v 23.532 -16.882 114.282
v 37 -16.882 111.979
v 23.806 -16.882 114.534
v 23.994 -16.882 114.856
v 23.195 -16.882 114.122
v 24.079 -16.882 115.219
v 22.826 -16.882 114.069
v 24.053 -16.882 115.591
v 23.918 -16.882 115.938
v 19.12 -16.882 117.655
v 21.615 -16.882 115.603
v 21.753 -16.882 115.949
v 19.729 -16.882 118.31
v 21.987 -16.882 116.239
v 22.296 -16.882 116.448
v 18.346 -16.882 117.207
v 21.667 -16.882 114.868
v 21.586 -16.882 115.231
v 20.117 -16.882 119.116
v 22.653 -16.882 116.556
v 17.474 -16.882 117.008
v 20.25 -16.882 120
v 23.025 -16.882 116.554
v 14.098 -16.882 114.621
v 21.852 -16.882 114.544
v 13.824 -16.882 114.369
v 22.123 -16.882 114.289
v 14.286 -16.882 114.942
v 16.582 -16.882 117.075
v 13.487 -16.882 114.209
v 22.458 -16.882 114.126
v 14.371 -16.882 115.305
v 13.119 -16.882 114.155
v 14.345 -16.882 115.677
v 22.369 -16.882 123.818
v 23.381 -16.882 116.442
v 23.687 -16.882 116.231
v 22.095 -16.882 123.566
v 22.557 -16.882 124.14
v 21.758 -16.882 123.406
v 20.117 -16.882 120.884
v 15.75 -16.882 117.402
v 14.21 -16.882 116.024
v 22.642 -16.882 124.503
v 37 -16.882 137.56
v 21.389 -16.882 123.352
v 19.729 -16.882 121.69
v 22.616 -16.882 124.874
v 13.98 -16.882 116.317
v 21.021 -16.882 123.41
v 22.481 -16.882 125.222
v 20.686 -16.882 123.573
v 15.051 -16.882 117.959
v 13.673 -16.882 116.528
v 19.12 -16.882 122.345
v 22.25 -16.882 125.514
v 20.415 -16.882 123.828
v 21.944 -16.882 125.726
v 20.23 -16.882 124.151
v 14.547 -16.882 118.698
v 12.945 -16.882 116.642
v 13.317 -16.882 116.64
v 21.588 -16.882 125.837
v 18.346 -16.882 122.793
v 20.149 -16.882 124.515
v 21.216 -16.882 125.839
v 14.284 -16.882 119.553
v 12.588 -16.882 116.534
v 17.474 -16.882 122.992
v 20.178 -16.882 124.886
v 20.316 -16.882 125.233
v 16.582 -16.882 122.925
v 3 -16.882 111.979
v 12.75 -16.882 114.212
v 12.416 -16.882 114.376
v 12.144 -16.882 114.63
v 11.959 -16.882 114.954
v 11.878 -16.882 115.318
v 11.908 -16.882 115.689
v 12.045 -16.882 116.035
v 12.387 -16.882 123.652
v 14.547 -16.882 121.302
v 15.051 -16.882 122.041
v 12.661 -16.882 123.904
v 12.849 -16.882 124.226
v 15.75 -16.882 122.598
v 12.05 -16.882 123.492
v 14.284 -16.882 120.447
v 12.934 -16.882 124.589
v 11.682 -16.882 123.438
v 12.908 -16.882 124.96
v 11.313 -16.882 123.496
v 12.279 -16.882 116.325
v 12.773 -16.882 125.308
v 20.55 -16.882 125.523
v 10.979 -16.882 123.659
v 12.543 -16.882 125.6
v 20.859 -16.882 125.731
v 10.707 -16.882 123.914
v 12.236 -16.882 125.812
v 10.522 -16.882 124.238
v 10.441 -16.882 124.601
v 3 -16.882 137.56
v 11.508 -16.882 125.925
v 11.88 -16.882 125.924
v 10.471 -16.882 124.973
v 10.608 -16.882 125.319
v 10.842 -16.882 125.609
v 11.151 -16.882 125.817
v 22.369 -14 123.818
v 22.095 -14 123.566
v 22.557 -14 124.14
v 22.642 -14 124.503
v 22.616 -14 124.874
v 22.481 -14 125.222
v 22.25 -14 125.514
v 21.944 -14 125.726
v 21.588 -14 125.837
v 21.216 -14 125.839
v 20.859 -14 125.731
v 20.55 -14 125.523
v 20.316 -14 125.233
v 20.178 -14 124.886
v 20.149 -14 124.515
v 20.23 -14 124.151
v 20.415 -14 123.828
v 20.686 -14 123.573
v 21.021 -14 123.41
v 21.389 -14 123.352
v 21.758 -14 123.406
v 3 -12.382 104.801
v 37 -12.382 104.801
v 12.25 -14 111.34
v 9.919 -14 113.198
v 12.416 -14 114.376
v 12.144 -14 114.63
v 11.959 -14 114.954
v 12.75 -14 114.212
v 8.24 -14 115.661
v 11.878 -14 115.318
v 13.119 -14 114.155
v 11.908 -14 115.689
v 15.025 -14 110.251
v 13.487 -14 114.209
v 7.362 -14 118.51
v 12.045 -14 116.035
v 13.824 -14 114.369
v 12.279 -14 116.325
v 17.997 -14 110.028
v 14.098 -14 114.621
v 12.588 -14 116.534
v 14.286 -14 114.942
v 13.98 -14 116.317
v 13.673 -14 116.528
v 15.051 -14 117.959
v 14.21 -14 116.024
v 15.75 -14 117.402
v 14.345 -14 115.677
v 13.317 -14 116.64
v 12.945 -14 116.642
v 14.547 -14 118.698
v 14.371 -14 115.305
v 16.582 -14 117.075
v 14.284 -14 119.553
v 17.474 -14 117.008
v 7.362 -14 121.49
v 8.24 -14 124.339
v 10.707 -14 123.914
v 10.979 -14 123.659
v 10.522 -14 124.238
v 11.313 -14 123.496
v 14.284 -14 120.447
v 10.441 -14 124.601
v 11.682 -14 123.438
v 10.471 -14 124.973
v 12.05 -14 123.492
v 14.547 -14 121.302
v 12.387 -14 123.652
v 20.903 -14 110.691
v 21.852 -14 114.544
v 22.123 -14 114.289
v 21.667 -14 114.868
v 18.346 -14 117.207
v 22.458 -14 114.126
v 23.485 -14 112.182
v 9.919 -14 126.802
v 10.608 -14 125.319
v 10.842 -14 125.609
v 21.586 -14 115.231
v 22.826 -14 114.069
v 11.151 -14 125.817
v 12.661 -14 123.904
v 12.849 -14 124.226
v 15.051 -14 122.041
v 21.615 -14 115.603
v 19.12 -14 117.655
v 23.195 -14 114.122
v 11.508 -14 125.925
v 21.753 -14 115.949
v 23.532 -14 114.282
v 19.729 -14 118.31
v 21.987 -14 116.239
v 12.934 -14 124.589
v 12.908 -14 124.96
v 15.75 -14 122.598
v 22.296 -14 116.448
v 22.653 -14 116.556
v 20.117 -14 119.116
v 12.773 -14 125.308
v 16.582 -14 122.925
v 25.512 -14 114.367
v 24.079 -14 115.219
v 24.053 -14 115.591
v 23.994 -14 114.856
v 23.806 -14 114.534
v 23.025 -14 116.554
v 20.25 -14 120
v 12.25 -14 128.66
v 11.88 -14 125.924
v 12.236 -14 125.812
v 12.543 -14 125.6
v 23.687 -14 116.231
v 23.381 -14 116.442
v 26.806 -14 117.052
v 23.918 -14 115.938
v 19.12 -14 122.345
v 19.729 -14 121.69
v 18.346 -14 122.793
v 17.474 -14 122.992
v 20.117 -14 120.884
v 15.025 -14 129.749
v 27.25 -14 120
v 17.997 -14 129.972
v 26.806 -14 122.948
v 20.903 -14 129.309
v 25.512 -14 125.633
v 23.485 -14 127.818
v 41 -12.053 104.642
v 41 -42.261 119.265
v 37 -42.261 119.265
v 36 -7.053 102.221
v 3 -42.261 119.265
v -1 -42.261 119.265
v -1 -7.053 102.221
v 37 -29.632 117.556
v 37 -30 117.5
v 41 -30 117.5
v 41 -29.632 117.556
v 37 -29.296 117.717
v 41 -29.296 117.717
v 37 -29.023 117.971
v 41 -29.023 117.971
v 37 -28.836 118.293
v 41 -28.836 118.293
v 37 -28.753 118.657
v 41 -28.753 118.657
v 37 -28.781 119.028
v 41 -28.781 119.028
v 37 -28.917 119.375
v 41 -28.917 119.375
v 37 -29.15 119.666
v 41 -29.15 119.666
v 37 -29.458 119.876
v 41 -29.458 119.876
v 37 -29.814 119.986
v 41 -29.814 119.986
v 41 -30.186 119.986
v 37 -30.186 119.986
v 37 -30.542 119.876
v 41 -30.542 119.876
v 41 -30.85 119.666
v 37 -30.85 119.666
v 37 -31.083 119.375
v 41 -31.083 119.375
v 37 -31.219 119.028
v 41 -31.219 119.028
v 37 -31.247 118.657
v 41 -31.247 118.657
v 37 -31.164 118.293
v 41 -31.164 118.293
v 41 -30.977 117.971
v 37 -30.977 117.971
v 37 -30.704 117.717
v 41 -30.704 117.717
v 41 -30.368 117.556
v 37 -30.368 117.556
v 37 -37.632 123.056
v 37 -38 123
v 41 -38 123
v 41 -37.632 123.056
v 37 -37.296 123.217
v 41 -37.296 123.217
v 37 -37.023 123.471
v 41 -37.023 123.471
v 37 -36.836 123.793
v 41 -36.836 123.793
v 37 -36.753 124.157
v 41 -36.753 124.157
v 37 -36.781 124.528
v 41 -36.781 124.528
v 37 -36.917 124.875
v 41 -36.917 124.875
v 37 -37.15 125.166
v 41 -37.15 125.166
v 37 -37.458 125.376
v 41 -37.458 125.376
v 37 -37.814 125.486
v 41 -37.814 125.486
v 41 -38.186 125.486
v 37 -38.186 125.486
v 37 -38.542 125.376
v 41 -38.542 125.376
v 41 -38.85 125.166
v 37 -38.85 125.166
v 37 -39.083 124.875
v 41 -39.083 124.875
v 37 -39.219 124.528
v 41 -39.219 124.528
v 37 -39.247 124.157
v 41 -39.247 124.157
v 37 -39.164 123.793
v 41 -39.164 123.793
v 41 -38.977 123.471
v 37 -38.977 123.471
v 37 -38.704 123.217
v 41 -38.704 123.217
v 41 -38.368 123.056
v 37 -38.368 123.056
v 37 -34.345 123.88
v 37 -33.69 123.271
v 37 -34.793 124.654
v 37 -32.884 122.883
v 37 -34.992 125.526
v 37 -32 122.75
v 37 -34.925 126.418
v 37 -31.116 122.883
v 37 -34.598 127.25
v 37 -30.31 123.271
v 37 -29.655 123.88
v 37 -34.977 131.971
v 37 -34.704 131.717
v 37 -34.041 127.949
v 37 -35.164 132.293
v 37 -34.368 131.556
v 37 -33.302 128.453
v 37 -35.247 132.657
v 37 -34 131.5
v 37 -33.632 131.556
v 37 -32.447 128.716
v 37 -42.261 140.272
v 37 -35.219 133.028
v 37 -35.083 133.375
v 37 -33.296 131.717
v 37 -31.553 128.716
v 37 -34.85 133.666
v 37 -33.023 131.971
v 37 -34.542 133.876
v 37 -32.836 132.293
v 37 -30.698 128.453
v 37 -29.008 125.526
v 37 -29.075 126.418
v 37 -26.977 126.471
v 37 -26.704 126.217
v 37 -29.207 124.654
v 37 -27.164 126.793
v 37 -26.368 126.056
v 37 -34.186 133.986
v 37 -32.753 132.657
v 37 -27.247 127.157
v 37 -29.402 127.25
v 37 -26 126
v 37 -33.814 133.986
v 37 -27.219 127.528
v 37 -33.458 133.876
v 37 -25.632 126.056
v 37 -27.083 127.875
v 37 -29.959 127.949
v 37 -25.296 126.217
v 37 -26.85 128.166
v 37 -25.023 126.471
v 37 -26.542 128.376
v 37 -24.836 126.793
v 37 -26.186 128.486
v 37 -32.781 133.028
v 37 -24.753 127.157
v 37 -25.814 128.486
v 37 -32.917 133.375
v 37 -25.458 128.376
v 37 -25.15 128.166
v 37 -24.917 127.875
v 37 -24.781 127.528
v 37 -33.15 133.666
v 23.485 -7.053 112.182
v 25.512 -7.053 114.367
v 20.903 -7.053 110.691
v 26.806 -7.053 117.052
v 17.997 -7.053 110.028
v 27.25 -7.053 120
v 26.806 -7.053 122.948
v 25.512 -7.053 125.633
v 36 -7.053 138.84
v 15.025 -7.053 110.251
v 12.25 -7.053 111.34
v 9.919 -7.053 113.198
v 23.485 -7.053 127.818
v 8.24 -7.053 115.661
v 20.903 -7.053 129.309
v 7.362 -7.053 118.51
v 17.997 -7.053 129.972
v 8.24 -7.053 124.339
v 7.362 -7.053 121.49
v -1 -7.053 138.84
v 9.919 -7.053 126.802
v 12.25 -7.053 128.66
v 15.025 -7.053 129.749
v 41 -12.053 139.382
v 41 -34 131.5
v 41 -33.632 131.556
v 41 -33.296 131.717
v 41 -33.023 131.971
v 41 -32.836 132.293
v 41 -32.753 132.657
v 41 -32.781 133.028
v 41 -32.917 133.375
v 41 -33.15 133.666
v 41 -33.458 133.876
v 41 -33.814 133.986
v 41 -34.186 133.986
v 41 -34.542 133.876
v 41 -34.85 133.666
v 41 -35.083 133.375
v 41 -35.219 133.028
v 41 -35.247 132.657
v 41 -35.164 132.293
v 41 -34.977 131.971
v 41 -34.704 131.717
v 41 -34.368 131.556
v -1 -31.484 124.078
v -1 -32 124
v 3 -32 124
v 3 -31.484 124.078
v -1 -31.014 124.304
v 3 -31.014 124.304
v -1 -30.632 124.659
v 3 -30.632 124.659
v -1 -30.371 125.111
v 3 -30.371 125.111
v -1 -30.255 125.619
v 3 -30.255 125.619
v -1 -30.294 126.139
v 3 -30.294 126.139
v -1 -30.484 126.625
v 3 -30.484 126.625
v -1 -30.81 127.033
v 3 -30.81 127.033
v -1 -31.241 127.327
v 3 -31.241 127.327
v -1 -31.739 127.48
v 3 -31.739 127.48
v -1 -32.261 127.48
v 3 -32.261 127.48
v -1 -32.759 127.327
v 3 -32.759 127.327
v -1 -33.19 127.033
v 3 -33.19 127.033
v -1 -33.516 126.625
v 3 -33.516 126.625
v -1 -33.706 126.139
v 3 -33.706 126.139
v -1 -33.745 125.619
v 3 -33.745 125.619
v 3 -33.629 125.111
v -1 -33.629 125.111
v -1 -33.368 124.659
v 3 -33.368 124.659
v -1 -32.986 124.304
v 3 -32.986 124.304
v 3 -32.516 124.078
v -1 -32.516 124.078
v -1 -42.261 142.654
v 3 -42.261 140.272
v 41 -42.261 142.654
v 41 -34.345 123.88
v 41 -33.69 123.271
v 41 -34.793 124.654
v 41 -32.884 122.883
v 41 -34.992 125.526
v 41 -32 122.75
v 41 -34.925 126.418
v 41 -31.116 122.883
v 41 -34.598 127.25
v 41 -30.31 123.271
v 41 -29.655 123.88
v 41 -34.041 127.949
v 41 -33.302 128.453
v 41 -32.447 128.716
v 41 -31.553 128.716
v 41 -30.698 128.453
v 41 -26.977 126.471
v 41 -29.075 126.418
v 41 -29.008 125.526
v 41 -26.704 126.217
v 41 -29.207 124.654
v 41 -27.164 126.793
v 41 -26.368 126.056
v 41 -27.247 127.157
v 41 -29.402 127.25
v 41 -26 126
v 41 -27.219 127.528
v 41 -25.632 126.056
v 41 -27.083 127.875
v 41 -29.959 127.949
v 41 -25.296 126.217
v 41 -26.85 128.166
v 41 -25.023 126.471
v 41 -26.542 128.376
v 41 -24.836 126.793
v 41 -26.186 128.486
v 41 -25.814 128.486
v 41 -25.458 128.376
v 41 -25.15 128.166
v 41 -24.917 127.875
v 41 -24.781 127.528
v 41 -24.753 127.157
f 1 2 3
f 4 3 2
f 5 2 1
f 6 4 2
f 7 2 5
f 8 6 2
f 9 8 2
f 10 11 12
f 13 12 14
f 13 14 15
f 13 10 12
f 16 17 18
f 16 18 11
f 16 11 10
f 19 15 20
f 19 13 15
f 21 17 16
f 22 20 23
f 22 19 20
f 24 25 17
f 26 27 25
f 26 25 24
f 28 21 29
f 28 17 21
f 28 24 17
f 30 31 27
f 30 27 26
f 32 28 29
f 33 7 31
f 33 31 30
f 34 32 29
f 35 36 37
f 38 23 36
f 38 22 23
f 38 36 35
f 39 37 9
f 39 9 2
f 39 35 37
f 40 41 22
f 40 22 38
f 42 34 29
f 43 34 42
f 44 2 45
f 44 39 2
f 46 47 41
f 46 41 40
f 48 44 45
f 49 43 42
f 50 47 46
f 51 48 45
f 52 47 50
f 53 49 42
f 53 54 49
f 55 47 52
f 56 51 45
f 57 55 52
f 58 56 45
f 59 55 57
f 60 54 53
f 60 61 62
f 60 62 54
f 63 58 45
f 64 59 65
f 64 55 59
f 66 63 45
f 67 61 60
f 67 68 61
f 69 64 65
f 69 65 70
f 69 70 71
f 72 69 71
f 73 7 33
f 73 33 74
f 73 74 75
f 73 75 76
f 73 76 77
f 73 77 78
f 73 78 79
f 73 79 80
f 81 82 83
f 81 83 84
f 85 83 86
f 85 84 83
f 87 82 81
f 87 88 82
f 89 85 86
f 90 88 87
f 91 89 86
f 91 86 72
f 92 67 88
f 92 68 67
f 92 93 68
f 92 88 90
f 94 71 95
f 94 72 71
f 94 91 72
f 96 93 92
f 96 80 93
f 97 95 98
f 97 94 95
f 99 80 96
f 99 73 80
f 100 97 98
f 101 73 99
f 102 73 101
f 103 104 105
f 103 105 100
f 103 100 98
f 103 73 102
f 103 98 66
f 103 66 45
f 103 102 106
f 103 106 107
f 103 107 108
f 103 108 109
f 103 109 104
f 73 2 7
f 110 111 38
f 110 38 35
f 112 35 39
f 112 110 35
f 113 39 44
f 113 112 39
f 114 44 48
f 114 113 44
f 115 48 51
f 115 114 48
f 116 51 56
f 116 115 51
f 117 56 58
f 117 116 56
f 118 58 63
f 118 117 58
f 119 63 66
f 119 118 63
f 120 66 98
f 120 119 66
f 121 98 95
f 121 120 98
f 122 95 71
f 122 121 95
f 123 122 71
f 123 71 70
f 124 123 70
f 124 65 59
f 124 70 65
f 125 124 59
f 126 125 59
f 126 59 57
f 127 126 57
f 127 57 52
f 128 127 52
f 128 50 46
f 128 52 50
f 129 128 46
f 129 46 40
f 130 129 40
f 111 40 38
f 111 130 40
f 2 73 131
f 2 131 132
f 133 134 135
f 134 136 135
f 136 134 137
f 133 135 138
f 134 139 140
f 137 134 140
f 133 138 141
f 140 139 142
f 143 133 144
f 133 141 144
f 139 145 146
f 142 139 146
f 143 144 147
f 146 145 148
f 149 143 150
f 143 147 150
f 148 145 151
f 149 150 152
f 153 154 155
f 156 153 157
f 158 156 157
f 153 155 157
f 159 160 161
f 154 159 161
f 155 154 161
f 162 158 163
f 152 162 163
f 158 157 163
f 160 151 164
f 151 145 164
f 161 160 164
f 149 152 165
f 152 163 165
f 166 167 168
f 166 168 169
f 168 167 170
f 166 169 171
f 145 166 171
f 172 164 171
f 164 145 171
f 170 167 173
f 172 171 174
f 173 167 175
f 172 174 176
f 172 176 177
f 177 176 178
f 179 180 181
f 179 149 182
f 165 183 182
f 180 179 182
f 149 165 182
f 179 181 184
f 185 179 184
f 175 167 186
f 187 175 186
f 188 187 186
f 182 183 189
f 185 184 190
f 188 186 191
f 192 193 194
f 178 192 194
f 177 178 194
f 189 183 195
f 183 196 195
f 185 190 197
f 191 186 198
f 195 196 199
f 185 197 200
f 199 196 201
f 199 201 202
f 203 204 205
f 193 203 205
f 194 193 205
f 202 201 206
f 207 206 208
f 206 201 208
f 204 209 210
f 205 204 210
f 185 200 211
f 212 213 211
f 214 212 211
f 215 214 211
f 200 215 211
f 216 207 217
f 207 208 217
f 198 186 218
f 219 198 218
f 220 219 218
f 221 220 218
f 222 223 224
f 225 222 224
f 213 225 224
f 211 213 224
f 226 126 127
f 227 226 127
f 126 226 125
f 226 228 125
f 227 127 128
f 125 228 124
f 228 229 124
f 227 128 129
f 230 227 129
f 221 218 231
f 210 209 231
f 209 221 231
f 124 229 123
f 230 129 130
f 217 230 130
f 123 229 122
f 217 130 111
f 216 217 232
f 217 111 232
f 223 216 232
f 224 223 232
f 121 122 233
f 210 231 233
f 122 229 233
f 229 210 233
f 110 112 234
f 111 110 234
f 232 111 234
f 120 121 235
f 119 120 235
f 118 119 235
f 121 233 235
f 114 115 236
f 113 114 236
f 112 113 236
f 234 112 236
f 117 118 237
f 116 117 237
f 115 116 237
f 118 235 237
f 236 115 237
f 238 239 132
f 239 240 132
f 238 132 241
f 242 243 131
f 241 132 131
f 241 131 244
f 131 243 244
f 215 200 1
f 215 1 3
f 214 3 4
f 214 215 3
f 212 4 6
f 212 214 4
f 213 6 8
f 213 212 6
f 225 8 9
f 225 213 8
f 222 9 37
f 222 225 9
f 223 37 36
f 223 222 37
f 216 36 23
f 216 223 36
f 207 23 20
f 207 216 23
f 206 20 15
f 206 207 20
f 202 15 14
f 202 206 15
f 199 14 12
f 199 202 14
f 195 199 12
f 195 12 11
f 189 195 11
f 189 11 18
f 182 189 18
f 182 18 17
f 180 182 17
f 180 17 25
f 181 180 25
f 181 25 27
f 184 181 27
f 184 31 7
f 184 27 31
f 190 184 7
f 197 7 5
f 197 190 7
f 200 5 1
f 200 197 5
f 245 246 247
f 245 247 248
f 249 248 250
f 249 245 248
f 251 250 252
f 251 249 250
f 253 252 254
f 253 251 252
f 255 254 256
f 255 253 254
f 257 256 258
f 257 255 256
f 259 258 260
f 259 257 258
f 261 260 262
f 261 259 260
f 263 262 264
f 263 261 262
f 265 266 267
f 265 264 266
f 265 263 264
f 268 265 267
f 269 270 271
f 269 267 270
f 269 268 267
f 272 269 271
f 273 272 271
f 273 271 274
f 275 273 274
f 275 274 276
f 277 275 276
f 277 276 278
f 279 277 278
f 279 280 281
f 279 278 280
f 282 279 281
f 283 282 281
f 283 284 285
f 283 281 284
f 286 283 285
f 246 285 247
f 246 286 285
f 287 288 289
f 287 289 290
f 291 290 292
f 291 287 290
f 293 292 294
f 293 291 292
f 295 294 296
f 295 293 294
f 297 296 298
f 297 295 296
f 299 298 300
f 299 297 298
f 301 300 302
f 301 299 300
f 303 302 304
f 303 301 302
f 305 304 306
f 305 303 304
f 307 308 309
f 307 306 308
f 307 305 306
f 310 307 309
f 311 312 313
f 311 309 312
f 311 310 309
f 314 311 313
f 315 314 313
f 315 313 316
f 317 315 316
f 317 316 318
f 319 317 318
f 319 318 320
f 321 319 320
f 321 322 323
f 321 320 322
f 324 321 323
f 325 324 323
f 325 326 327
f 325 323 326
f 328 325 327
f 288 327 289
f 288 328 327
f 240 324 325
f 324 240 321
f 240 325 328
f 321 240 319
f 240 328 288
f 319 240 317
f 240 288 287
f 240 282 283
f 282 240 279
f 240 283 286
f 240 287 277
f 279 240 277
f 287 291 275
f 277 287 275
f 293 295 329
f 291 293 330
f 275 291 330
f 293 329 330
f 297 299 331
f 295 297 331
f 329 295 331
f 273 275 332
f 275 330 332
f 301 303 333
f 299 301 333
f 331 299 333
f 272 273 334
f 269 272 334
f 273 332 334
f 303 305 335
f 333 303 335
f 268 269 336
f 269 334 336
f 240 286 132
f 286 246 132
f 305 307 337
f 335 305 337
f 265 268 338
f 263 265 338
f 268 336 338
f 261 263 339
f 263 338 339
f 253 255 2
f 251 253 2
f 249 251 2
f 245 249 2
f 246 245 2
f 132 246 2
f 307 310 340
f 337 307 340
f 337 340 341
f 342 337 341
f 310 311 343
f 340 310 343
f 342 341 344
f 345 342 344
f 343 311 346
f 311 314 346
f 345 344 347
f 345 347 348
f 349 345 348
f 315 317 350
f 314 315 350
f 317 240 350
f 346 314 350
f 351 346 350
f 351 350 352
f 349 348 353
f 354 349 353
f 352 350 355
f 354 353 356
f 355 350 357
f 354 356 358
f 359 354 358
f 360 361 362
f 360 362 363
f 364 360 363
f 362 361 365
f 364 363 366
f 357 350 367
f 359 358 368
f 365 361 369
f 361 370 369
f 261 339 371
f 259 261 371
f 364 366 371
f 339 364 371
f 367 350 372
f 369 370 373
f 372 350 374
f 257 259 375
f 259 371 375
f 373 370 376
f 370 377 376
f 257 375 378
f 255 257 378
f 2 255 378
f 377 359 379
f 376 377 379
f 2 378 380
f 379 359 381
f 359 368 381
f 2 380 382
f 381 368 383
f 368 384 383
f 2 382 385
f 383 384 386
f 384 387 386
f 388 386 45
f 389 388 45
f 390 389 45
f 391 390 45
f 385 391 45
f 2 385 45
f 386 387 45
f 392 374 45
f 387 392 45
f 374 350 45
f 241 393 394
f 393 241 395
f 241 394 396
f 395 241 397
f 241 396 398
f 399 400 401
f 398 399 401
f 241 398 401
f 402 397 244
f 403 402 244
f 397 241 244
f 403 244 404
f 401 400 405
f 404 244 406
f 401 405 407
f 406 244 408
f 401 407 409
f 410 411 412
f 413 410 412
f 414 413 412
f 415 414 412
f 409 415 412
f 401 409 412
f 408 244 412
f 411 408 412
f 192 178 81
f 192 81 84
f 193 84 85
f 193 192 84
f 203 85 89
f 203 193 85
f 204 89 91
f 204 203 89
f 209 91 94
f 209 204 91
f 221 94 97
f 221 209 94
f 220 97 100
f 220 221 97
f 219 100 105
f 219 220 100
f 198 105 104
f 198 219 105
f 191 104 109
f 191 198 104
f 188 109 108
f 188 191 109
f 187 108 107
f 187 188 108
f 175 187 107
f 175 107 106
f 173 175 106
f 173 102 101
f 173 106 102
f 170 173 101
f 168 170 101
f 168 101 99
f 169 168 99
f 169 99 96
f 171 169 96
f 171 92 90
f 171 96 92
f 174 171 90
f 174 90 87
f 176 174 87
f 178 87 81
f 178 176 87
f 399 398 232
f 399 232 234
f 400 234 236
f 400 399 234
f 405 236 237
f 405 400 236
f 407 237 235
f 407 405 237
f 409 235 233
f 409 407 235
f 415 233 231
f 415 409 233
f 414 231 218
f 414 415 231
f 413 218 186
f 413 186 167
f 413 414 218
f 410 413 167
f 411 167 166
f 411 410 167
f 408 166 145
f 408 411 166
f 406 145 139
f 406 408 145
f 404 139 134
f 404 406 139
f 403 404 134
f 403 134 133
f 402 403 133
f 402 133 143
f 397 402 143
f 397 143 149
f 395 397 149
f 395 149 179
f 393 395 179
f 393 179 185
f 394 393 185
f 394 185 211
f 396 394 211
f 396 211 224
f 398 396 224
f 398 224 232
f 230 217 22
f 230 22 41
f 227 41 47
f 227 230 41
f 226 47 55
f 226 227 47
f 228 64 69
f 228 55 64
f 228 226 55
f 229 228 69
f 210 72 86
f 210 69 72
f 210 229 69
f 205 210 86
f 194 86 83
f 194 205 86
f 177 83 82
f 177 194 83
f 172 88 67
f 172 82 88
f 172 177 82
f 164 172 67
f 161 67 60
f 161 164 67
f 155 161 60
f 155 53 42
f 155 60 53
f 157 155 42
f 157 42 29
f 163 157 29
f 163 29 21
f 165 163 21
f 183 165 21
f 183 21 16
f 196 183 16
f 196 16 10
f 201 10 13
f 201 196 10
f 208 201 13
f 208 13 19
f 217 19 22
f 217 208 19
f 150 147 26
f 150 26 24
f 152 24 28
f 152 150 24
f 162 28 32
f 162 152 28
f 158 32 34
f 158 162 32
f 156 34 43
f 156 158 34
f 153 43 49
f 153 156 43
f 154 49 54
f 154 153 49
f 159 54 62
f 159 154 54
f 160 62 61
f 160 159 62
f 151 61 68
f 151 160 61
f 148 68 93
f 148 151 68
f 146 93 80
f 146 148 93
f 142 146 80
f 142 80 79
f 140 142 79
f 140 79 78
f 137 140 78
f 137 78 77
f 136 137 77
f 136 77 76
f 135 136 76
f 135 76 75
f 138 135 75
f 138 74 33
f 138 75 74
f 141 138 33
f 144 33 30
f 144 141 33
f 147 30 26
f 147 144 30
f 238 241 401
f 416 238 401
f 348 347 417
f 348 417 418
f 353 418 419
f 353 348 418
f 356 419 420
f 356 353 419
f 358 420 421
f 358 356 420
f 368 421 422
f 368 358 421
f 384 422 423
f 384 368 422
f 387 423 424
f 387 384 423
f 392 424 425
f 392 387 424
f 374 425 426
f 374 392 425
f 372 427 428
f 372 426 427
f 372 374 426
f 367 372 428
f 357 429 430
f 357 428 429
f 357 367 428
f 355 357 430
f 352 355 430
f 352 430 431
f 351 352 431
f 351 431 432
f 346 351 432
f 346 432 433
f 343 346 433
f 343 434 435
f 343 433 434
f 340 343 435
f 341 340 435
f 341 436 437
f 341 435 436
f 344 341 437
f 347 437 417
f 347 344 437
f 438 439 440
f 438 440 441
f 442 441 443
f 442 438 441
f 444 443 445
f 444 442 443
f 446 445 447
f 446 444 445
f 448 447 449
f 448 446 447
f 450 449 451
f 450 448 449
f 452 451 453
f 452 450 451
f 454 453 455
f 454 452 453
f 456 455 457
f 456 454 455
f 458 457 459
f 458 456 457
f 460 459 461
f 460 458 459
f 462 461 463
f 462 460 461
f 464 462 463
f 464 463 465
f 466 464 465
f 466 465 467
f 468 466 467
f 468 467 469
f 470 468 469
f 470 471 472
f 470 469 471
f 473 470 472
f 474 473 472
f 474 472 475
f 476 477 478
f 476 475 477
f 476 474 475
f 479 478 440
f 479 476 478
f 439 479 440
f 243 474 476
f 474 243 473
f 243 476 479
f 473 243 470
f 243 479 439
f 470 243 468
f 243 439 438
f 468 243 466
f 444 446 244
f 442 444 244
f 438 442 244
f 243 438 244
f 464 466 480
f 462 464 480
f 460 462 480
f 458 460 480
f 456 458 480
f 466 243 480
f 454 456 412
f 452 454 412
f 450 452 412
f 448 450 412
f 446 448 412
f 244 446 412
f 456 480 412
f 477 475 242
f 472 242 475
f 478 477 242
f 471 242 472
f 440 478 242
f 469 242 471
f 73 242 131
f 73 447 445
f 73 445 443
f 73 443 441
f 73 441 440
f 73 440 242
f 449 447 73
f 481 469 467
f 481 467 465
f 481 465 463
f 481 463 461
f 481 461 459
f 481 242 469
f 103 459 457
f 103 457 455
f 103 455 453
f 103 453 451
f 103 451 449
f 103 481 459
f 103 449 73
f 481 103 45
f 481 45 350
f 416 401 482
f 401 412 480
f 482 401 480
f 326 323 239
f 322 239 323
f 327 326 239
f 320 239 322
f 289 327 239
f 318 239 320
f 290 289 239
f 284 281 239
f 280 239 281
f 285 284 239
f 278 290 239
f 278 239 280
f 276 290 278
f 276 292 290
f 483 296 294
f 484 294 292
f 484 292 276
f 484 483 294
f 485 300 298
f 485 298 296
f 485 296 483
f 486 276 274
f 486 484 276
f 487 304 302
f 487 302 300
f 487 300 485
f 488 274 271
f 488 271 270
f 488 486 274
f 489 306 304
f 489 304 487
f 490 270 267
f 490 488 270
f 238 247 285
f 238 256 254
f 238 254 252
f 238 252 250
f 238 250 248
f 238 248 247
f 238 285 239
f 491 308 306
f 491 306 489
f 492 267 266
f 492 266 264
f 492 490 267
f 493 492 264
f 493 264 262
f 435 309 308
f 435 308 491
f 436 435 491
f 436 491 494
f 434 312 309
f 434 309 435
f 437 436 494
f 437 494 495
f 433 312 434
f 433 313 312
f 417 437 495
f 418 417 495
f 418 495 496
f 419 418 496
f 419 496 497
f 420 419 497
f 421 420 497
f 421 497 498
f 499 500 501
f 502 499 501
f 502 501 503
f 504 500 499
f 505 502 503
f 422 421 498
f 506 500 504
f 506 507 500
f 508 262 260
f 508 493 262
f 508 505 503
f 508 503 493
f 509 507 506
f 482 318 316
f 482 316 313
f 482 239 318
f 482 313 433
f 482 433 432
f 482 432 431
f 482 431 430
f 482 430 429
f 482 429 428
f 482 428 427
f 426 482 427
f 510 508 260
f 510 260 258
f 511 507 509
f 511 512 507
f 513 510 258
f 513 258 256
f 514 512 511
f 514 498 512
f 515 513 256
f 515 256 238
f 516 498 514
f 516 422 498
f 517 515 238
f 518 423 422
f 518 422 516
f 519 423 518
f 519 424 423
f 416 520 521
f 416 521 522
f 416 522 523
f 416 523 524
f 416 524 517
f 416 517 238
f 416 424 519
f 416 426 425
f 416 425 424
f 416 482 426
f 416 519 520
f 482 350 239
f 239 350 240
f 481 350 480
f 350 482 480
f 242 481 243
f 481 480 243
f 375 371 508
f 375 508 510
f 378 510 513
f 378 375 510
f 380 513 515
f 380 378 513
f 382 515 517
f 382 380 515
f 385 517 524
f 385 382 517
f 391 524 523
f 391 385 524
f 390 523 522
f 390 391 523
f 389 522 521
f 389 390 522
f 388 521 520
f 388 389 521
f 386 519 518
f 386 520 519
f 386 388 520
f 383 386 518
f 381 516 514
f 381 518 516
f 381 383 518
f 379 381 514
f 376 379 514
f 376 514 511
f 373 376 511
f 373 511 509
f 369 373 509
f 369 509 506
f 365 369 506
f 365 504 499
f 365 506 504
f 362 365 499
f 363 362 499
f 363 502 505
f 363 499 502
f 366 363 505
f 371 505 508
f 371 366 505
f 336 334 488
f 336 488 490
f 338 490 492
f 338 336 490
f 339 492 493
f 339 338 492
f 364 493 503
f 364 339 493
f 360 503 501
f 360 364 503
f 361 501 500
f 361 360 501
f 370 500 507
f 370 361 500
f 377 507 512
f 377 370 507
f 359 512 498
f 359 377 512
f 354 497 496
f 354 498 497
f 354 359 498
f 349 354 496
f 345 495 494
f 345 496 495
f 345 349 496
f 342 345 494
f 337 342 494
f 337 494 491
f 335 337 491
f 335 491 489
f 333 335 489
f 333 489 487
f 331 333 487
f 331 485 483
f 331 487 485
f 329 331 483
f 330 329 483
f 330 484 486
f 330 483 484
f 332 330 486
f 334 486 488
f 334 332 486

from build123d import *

# Parameters (mm, degrees)
CYLINDER067_R             = 1.75
CYLINDER067_DEPTH         = 22
CYLINDER067_PITCH_ANGLE   = 90
CYLINDER061_R             = 1.25
CYLINDER061_DEPTH         = 22
CYLINDER061_PITCH_ANGLE   = 90
CYLINDER062_R             = 1.25
CYLINDER062_DEPTH         = 22
CYLINDER062_PITCH_ANGLE   = 90
CYLINDER060_R             = 1.25
CYLINDER060_DEPTH         = 22
CYLINDER060_PITCH_ANGLE   = 90
CYLINDER059_R             = 1.25
CYLINDER059_DEPTH         = 22
CYLINDER059_PITCH_ANGLE   = 90
CYLINDER065_R             = 1.25
CYLINDER065_DEPTH         = 22
CYLINDER065_PITCH_ANGLE   = 90
CYLINDER066_R             = 1.25
CYLINDER066_DEPTH         = 22
CYLINDER066_PITCH_ANGLE   = 90
CYLINDER064_R             = 1.25
CYLINDER064_DEPTH         = 22
CYLINDER064_PITCH_ANGLE   = 90
CYLINDER063_R             = 1.25
CYLINDER063_DEPTH         = 22
CYLINDER063_PITCH_ANGLE   = 90
FUSION047_ROLL_ANGLE      = 34
FUSION047_PLACEMENT_ANGLE = -90
CYLINDER058_R             = 3
CYLINDER058_DEPTH         = 22
CYLINDER058_PITCH_ANGLE   = 90
CYLINDER057_R             = 3
CYLINDER057_DEPTH         = 13
CYLINDER057_ROLL_ANGLE    = 90
CYLINDER056_R             = 10
CYLINDER056_DEPTH         = 10
CYLINDER056_ROLL_ANGLE    = 90
PAD007_DEPTH              = 34
PAD005_DEPTH              = 42
CHAMFER104_SIZE           = 5
CHAMFER105_SIZE           = 5


with BuildPart() as cilindro011:
    # Cylinder067 → Cylinder067 (new body)
    with BuildSketch(Plane.XY):
        Circle(CYLINDER067_R)
    extrude(amount=CYLINDER067_DEPTH)


with BuildPart() as cilindro011_1:
    # Cylinder067 pitch: moved
    add(cilindro011.part.rotate(Axis((0, 0, 0), (0, 1, 0)), CYLINDER067_PITCH_ANGLE))


with BuildPart() as cilindro011_2:
    # Cylinder067 placement: moved
    add(cilindro011_1.part.moved(Location((-4.75, -32, 125.75))))


with BuildPart() as cilindro005:
    # Cylinder061 → Cylinder061 (new body)
    with BuildSketch(Plane.XY):
        Circle(CYLINDER061_R)
    extrude(amount=CYLINDER061_DEPTH)


with BuildPart() as cilindro005_1:
    # Cylinder061 pitch: moved
    add(cilindro005.part.rotate(Axis((0, 0, 0), (0, 1, 0)), CYLINDER061_PITCH_ANGLE))


with BuildPart() as cilindro005_2:
    # Cylinder061 placement: moved
    add(cilindro005_1.part.moved(Location((20.25, -38, 124.25))))


with BuildPart() as cilindro006:
    # Cylinder062 → Cylinder062 (new body)
    with BuildSketch(Plane.XY):
        Circle(CYLINDER062_R)
    extrude(amount=CYLINDER062_DEPTH)


with BuildPart() as cilindro006_1:
    # Cylinder062 pitch: moved
    add(cilindro006.part.rotate(Axis((0, 0, 0), (0, 1, 0)), CYLINDER062_PITCH_ANGLE))


with BuildPart() as cilindro006_2:
    # Cylinder062 placement: moved
    add(cilindro006_1.part.moved(Location((20.25, -26, 127.25))))


with BuildPart() as cilindro004:
    # Cylinder060 → Cylinder060 (new body)
    with BuildSketch(Plane.XY):
        Circle(CYLINDER060_R)
    extrude(amount=CYLINDER060_DEPTH)


with BuildPart() as cilindro004_1:
    # Cylinder060 pitch: moved
    add(cilindro004.part.rotate(Axis((0, 0, 0), (0, 1, 0)), CYLINDER060_PITCH_ANGLE))


with BuildPart() as cilindro004_2:
    # Cylinder060 placement: moved
    add(cilindro004_1.part.moved(Location((20.25, -30, 118.75))))


with BuildPart() as fusion046:
    # Cylinder059 → Cylinder059 (new body)
    with BuildSketch(Plane.XY):
        Circle(CYLINDER059_R)
    extrude(amount=CYLINDER059_DEPTH)


with BuildPart() as fusion046_1:
    # Cylinder059 pitch: moved
    add(fusion046.part.rotate(Axis((0, 0, 0), (0, 1, 0)), CYLINDER059_PITCH_ANGLE))


with BuildPart() as fusion046_2:
    # Cylinder059 placement: moved
    add(fusion046_1.part.moved(Location((20.25, -34, 132.75))))

    # Fusion046: union Cilindro005, Cilindro006, Cilindro004
    add(cilindro005_2.part)
    add(cilindro006_2.part)
    add(cilindro004_2.part)


with BuildPart() as cilindro009:
    # Cylinder065 → Cylinder065 (new body)
    with BuildSketch(Plane.XY):
        Circle(CYLINDER065_R)
    extrude(amount=CYLINDER065_DEPTH)


with BuildPart() as cilindro009_1:
    # Cylinder065 pitch: moved
    add(cilindro009.part.rotate(Axis((0, 0, 0), (0, 1, 0)), CYLINDER065_PITCH_ANGLE))


with BuildPart() as cilindro009_2:
    # Cylinder065 placement: moved
    add(cilindro009_1.part.moved(Location((20.25, -38, 124.25))))


with BuildPart() as cilindro010:
    # Cylinder066 → Cylinder066 (new body)
    with BuildSketch(Plane.XY):
        Circle(CYLINDER066_R)
    extrude(amount=CYLINDER066_DEPTH)


with BuildPart() as cilindro010_1:
    # Cylinder066 pitch: moved
    add(cilindro010.part.rotate(Axis((0, 0, 0), (0, 1, 0)), CYLINDER066_PITCH_ANGLE))


with BuildPart() as cilindro010_2:
    # Cylinder066 placement: moved
    add(cilindro010_1.part.moved(Location((20.25, -26, 127.25))))


with BuildPart() as cilindro008:
    # Cylinder064 → Cylinder064 (new body)
    with BuildSketch(Plane.XY):
        Circle(CYLINDER064_R)
    extrude(amount=CYLINDER064_DEPTH)


with BuildPart() as cilindro008_1:
    # Cylinder064 pitch: moved
    add(cilindro008.part.rotate(Axis((0, 0, 0), (0, 1, 0)), CYLINDER064_PITCH_ANGLE))


with BuildPart() as cilindro008_2:
    # Cylinder064 placement: moved
    add(cilindro008_1.part.moved(Location((20.25, -30, 118.75))))


with BuildPart() as fusion047:
    # Cylinder063 → Cylinder063 (new body)
    with BuildSketch(Plane.XY):
        Circle(CYLINDER063_R)
    extrude(amount=CYLINDER063_DEPTH)


with BuildPart() as fusion047_1:
    # Cylinder063 pitch: moved
    add(fusion047.part.rotate(Axis((0, 0, 0), (0, 1, 0)), CYLINDER063_PITCH_ANGLE))


with BuildPart() as fusion047_2:
    # Cylinder063 placement: moved
    add(fusion047_1.part.moved(Location((20.25, -34, 132.75))))

    # Fusion047: union Cilindro009, Cilindro010, Cilindro008
    add(cilindro009_2.part)
    add(cilindro010_2.part)
    add(cilindro008_2.part)


with BuildPart() as fusion047_3:
    # Fusion047 roll: moved
    add(fusion047_2.part.rotate(Axis((0, 0, 0), (1, 0, 0)), FUSION047_ROLL_ANGLE))


with BuildPart() as fusion047_4:
    # Fusion047 placement: moved
    add(fusion047_3.part.moved(Location((114.107998, 21, 33.646227))).rotate(Axis((114.107998, 21, 33.646227), (0, 0, 1)), FUSION047_PLACEMENT_ANGLE))


with BuildPart() as cilindro002:
    # Cylinder058 → Cylinder058 (new body)
    with BuildSketch(Plane.XY):
        Circle(CYLINDER058_R)
    extrude(amount=CYLINDER058_DEPTH)


with BuildPart() as cilindro002_1:
    # Cylinder058 pitch: moved
    add(cilindro002.part.rotate(Axis((0, 0, 0), (0, 1, 0)), CYLINDER058_PITCH_ANGLE))


with BuildPart() as cilindro002_2:
    # Cylinder058 placement: moved
    add(cilindro002_1.part.moved(Location((20.25, -32, 125.75))))


with BuildPart() as cilindro001:
    # Cylinder057 → Cylinder057 (new body)
    with BuildSketch(Plane.XY):
        Circle(CYLINDER057_R)
    extrude(amount=CYLINDER057_DEPTH)


with BuildPart() as cilindro001_1:
    # Cylinder057 roll: moved
    add(cilindro001.part.rotate(Axis((0, 0, 0), (1, 0, 0)), CYLINDER057_ROLL_ANGLE))


with BuildPart() as cilindro001_2:
    # Cylinder057 placement: moved
    add(cilindro001_1.part.moved(Location((17.25, -6, 120))))


with BuildPart() as cilindro:
    # Cylinder056 → Cylinder056 (new body)
    with BuildSketch(Plane.XY):
        Circle(CYLINDER056_R)
    extrude(amount=CYLINDER056_DEPTH)


with BuildPart() as cilindro_1:
    # Cylinder056 roll: moved
    add(cilindro.part.rotate(Axis((0, 0, 0), (1, 0, 0)), CYLINDER056_ROLL_ANGLE))


with BuildPart() as cilindro_2:
    # Cylinder056 placement: moved
    add(cilindro_1.part.moved(Location((17.25, -4, 120))))


with BuildPart() as pad007:
    # Sketch012 → Pad007 (new body)
    with BuildSketch(Plane(origin=(3, -12, -1), x_dir=(0, 1, 0), z_dir=(1, 0, 0))):
        Polygon((-4.882067, 101.940956), (-4.882067, 138.559921), (-40.571098, 142.373672), (-40.571098, 120.688431), align=None)
    extrude(amount=PAD007_DEPTH)


with BuildPart() as shoulder_src:
    # Sketch010 → Pad005 (new body)
    with BuildSketch(Plane.YZ.offset(-1)):
        Polygon((-7.053021, 102.221077), (-7.053021, 138.840042), (-42.260719, 142.653793), (-42.260719, 119.265137), align=None)
    extrude(amount=PAD005_DEPTH)

    # Cut085: cut Pad007
    add(pad007.part, mode=Mode.SUBTRACT)

    # Cut086: cut Cilindro
    add(cilindro_2.part, mode=Mode.SUBTRACT)

    # Cut087: cut Cilindro001
    add(cilindro001_2.part, mode=Mode.SUBTRACT)

    # Chamfer104
    chamfer104_edges = [shoulder_src.edges().sort_by_distance(p)[0] for p in [
        (20, -16.882067, 106.979322),
    ]]
    chamfer(chamfer104_edges, length=CHAMFER104_SIZE)

    # Cut088: cut Cilindro002
    add(cilindro002_2.part, mode=Mode.SUBTRACT)

    # Cut089: cut Fusion047
    add(fusion047_4.part, mode=Mode.SUBTRACT)

    # Cut090: cut Fusion046
    add(fusion046_2.part, mode=Mode.SUBTRACT)

    # Cut091: cut Cilindro011
    add(cilindro011_2.part, mode=Mode.SUBTRACT)

    # Chamfer105
    chamfer105_edges = [shoulder_src.edges().sort_by_distance(p)[0] for p in [
        (41, -7.053021, 120.530559),
    ]]
    chamfer(chamfer105_edges, length=CHAMFER105_SIZE)


solid = shoulder_src.part
